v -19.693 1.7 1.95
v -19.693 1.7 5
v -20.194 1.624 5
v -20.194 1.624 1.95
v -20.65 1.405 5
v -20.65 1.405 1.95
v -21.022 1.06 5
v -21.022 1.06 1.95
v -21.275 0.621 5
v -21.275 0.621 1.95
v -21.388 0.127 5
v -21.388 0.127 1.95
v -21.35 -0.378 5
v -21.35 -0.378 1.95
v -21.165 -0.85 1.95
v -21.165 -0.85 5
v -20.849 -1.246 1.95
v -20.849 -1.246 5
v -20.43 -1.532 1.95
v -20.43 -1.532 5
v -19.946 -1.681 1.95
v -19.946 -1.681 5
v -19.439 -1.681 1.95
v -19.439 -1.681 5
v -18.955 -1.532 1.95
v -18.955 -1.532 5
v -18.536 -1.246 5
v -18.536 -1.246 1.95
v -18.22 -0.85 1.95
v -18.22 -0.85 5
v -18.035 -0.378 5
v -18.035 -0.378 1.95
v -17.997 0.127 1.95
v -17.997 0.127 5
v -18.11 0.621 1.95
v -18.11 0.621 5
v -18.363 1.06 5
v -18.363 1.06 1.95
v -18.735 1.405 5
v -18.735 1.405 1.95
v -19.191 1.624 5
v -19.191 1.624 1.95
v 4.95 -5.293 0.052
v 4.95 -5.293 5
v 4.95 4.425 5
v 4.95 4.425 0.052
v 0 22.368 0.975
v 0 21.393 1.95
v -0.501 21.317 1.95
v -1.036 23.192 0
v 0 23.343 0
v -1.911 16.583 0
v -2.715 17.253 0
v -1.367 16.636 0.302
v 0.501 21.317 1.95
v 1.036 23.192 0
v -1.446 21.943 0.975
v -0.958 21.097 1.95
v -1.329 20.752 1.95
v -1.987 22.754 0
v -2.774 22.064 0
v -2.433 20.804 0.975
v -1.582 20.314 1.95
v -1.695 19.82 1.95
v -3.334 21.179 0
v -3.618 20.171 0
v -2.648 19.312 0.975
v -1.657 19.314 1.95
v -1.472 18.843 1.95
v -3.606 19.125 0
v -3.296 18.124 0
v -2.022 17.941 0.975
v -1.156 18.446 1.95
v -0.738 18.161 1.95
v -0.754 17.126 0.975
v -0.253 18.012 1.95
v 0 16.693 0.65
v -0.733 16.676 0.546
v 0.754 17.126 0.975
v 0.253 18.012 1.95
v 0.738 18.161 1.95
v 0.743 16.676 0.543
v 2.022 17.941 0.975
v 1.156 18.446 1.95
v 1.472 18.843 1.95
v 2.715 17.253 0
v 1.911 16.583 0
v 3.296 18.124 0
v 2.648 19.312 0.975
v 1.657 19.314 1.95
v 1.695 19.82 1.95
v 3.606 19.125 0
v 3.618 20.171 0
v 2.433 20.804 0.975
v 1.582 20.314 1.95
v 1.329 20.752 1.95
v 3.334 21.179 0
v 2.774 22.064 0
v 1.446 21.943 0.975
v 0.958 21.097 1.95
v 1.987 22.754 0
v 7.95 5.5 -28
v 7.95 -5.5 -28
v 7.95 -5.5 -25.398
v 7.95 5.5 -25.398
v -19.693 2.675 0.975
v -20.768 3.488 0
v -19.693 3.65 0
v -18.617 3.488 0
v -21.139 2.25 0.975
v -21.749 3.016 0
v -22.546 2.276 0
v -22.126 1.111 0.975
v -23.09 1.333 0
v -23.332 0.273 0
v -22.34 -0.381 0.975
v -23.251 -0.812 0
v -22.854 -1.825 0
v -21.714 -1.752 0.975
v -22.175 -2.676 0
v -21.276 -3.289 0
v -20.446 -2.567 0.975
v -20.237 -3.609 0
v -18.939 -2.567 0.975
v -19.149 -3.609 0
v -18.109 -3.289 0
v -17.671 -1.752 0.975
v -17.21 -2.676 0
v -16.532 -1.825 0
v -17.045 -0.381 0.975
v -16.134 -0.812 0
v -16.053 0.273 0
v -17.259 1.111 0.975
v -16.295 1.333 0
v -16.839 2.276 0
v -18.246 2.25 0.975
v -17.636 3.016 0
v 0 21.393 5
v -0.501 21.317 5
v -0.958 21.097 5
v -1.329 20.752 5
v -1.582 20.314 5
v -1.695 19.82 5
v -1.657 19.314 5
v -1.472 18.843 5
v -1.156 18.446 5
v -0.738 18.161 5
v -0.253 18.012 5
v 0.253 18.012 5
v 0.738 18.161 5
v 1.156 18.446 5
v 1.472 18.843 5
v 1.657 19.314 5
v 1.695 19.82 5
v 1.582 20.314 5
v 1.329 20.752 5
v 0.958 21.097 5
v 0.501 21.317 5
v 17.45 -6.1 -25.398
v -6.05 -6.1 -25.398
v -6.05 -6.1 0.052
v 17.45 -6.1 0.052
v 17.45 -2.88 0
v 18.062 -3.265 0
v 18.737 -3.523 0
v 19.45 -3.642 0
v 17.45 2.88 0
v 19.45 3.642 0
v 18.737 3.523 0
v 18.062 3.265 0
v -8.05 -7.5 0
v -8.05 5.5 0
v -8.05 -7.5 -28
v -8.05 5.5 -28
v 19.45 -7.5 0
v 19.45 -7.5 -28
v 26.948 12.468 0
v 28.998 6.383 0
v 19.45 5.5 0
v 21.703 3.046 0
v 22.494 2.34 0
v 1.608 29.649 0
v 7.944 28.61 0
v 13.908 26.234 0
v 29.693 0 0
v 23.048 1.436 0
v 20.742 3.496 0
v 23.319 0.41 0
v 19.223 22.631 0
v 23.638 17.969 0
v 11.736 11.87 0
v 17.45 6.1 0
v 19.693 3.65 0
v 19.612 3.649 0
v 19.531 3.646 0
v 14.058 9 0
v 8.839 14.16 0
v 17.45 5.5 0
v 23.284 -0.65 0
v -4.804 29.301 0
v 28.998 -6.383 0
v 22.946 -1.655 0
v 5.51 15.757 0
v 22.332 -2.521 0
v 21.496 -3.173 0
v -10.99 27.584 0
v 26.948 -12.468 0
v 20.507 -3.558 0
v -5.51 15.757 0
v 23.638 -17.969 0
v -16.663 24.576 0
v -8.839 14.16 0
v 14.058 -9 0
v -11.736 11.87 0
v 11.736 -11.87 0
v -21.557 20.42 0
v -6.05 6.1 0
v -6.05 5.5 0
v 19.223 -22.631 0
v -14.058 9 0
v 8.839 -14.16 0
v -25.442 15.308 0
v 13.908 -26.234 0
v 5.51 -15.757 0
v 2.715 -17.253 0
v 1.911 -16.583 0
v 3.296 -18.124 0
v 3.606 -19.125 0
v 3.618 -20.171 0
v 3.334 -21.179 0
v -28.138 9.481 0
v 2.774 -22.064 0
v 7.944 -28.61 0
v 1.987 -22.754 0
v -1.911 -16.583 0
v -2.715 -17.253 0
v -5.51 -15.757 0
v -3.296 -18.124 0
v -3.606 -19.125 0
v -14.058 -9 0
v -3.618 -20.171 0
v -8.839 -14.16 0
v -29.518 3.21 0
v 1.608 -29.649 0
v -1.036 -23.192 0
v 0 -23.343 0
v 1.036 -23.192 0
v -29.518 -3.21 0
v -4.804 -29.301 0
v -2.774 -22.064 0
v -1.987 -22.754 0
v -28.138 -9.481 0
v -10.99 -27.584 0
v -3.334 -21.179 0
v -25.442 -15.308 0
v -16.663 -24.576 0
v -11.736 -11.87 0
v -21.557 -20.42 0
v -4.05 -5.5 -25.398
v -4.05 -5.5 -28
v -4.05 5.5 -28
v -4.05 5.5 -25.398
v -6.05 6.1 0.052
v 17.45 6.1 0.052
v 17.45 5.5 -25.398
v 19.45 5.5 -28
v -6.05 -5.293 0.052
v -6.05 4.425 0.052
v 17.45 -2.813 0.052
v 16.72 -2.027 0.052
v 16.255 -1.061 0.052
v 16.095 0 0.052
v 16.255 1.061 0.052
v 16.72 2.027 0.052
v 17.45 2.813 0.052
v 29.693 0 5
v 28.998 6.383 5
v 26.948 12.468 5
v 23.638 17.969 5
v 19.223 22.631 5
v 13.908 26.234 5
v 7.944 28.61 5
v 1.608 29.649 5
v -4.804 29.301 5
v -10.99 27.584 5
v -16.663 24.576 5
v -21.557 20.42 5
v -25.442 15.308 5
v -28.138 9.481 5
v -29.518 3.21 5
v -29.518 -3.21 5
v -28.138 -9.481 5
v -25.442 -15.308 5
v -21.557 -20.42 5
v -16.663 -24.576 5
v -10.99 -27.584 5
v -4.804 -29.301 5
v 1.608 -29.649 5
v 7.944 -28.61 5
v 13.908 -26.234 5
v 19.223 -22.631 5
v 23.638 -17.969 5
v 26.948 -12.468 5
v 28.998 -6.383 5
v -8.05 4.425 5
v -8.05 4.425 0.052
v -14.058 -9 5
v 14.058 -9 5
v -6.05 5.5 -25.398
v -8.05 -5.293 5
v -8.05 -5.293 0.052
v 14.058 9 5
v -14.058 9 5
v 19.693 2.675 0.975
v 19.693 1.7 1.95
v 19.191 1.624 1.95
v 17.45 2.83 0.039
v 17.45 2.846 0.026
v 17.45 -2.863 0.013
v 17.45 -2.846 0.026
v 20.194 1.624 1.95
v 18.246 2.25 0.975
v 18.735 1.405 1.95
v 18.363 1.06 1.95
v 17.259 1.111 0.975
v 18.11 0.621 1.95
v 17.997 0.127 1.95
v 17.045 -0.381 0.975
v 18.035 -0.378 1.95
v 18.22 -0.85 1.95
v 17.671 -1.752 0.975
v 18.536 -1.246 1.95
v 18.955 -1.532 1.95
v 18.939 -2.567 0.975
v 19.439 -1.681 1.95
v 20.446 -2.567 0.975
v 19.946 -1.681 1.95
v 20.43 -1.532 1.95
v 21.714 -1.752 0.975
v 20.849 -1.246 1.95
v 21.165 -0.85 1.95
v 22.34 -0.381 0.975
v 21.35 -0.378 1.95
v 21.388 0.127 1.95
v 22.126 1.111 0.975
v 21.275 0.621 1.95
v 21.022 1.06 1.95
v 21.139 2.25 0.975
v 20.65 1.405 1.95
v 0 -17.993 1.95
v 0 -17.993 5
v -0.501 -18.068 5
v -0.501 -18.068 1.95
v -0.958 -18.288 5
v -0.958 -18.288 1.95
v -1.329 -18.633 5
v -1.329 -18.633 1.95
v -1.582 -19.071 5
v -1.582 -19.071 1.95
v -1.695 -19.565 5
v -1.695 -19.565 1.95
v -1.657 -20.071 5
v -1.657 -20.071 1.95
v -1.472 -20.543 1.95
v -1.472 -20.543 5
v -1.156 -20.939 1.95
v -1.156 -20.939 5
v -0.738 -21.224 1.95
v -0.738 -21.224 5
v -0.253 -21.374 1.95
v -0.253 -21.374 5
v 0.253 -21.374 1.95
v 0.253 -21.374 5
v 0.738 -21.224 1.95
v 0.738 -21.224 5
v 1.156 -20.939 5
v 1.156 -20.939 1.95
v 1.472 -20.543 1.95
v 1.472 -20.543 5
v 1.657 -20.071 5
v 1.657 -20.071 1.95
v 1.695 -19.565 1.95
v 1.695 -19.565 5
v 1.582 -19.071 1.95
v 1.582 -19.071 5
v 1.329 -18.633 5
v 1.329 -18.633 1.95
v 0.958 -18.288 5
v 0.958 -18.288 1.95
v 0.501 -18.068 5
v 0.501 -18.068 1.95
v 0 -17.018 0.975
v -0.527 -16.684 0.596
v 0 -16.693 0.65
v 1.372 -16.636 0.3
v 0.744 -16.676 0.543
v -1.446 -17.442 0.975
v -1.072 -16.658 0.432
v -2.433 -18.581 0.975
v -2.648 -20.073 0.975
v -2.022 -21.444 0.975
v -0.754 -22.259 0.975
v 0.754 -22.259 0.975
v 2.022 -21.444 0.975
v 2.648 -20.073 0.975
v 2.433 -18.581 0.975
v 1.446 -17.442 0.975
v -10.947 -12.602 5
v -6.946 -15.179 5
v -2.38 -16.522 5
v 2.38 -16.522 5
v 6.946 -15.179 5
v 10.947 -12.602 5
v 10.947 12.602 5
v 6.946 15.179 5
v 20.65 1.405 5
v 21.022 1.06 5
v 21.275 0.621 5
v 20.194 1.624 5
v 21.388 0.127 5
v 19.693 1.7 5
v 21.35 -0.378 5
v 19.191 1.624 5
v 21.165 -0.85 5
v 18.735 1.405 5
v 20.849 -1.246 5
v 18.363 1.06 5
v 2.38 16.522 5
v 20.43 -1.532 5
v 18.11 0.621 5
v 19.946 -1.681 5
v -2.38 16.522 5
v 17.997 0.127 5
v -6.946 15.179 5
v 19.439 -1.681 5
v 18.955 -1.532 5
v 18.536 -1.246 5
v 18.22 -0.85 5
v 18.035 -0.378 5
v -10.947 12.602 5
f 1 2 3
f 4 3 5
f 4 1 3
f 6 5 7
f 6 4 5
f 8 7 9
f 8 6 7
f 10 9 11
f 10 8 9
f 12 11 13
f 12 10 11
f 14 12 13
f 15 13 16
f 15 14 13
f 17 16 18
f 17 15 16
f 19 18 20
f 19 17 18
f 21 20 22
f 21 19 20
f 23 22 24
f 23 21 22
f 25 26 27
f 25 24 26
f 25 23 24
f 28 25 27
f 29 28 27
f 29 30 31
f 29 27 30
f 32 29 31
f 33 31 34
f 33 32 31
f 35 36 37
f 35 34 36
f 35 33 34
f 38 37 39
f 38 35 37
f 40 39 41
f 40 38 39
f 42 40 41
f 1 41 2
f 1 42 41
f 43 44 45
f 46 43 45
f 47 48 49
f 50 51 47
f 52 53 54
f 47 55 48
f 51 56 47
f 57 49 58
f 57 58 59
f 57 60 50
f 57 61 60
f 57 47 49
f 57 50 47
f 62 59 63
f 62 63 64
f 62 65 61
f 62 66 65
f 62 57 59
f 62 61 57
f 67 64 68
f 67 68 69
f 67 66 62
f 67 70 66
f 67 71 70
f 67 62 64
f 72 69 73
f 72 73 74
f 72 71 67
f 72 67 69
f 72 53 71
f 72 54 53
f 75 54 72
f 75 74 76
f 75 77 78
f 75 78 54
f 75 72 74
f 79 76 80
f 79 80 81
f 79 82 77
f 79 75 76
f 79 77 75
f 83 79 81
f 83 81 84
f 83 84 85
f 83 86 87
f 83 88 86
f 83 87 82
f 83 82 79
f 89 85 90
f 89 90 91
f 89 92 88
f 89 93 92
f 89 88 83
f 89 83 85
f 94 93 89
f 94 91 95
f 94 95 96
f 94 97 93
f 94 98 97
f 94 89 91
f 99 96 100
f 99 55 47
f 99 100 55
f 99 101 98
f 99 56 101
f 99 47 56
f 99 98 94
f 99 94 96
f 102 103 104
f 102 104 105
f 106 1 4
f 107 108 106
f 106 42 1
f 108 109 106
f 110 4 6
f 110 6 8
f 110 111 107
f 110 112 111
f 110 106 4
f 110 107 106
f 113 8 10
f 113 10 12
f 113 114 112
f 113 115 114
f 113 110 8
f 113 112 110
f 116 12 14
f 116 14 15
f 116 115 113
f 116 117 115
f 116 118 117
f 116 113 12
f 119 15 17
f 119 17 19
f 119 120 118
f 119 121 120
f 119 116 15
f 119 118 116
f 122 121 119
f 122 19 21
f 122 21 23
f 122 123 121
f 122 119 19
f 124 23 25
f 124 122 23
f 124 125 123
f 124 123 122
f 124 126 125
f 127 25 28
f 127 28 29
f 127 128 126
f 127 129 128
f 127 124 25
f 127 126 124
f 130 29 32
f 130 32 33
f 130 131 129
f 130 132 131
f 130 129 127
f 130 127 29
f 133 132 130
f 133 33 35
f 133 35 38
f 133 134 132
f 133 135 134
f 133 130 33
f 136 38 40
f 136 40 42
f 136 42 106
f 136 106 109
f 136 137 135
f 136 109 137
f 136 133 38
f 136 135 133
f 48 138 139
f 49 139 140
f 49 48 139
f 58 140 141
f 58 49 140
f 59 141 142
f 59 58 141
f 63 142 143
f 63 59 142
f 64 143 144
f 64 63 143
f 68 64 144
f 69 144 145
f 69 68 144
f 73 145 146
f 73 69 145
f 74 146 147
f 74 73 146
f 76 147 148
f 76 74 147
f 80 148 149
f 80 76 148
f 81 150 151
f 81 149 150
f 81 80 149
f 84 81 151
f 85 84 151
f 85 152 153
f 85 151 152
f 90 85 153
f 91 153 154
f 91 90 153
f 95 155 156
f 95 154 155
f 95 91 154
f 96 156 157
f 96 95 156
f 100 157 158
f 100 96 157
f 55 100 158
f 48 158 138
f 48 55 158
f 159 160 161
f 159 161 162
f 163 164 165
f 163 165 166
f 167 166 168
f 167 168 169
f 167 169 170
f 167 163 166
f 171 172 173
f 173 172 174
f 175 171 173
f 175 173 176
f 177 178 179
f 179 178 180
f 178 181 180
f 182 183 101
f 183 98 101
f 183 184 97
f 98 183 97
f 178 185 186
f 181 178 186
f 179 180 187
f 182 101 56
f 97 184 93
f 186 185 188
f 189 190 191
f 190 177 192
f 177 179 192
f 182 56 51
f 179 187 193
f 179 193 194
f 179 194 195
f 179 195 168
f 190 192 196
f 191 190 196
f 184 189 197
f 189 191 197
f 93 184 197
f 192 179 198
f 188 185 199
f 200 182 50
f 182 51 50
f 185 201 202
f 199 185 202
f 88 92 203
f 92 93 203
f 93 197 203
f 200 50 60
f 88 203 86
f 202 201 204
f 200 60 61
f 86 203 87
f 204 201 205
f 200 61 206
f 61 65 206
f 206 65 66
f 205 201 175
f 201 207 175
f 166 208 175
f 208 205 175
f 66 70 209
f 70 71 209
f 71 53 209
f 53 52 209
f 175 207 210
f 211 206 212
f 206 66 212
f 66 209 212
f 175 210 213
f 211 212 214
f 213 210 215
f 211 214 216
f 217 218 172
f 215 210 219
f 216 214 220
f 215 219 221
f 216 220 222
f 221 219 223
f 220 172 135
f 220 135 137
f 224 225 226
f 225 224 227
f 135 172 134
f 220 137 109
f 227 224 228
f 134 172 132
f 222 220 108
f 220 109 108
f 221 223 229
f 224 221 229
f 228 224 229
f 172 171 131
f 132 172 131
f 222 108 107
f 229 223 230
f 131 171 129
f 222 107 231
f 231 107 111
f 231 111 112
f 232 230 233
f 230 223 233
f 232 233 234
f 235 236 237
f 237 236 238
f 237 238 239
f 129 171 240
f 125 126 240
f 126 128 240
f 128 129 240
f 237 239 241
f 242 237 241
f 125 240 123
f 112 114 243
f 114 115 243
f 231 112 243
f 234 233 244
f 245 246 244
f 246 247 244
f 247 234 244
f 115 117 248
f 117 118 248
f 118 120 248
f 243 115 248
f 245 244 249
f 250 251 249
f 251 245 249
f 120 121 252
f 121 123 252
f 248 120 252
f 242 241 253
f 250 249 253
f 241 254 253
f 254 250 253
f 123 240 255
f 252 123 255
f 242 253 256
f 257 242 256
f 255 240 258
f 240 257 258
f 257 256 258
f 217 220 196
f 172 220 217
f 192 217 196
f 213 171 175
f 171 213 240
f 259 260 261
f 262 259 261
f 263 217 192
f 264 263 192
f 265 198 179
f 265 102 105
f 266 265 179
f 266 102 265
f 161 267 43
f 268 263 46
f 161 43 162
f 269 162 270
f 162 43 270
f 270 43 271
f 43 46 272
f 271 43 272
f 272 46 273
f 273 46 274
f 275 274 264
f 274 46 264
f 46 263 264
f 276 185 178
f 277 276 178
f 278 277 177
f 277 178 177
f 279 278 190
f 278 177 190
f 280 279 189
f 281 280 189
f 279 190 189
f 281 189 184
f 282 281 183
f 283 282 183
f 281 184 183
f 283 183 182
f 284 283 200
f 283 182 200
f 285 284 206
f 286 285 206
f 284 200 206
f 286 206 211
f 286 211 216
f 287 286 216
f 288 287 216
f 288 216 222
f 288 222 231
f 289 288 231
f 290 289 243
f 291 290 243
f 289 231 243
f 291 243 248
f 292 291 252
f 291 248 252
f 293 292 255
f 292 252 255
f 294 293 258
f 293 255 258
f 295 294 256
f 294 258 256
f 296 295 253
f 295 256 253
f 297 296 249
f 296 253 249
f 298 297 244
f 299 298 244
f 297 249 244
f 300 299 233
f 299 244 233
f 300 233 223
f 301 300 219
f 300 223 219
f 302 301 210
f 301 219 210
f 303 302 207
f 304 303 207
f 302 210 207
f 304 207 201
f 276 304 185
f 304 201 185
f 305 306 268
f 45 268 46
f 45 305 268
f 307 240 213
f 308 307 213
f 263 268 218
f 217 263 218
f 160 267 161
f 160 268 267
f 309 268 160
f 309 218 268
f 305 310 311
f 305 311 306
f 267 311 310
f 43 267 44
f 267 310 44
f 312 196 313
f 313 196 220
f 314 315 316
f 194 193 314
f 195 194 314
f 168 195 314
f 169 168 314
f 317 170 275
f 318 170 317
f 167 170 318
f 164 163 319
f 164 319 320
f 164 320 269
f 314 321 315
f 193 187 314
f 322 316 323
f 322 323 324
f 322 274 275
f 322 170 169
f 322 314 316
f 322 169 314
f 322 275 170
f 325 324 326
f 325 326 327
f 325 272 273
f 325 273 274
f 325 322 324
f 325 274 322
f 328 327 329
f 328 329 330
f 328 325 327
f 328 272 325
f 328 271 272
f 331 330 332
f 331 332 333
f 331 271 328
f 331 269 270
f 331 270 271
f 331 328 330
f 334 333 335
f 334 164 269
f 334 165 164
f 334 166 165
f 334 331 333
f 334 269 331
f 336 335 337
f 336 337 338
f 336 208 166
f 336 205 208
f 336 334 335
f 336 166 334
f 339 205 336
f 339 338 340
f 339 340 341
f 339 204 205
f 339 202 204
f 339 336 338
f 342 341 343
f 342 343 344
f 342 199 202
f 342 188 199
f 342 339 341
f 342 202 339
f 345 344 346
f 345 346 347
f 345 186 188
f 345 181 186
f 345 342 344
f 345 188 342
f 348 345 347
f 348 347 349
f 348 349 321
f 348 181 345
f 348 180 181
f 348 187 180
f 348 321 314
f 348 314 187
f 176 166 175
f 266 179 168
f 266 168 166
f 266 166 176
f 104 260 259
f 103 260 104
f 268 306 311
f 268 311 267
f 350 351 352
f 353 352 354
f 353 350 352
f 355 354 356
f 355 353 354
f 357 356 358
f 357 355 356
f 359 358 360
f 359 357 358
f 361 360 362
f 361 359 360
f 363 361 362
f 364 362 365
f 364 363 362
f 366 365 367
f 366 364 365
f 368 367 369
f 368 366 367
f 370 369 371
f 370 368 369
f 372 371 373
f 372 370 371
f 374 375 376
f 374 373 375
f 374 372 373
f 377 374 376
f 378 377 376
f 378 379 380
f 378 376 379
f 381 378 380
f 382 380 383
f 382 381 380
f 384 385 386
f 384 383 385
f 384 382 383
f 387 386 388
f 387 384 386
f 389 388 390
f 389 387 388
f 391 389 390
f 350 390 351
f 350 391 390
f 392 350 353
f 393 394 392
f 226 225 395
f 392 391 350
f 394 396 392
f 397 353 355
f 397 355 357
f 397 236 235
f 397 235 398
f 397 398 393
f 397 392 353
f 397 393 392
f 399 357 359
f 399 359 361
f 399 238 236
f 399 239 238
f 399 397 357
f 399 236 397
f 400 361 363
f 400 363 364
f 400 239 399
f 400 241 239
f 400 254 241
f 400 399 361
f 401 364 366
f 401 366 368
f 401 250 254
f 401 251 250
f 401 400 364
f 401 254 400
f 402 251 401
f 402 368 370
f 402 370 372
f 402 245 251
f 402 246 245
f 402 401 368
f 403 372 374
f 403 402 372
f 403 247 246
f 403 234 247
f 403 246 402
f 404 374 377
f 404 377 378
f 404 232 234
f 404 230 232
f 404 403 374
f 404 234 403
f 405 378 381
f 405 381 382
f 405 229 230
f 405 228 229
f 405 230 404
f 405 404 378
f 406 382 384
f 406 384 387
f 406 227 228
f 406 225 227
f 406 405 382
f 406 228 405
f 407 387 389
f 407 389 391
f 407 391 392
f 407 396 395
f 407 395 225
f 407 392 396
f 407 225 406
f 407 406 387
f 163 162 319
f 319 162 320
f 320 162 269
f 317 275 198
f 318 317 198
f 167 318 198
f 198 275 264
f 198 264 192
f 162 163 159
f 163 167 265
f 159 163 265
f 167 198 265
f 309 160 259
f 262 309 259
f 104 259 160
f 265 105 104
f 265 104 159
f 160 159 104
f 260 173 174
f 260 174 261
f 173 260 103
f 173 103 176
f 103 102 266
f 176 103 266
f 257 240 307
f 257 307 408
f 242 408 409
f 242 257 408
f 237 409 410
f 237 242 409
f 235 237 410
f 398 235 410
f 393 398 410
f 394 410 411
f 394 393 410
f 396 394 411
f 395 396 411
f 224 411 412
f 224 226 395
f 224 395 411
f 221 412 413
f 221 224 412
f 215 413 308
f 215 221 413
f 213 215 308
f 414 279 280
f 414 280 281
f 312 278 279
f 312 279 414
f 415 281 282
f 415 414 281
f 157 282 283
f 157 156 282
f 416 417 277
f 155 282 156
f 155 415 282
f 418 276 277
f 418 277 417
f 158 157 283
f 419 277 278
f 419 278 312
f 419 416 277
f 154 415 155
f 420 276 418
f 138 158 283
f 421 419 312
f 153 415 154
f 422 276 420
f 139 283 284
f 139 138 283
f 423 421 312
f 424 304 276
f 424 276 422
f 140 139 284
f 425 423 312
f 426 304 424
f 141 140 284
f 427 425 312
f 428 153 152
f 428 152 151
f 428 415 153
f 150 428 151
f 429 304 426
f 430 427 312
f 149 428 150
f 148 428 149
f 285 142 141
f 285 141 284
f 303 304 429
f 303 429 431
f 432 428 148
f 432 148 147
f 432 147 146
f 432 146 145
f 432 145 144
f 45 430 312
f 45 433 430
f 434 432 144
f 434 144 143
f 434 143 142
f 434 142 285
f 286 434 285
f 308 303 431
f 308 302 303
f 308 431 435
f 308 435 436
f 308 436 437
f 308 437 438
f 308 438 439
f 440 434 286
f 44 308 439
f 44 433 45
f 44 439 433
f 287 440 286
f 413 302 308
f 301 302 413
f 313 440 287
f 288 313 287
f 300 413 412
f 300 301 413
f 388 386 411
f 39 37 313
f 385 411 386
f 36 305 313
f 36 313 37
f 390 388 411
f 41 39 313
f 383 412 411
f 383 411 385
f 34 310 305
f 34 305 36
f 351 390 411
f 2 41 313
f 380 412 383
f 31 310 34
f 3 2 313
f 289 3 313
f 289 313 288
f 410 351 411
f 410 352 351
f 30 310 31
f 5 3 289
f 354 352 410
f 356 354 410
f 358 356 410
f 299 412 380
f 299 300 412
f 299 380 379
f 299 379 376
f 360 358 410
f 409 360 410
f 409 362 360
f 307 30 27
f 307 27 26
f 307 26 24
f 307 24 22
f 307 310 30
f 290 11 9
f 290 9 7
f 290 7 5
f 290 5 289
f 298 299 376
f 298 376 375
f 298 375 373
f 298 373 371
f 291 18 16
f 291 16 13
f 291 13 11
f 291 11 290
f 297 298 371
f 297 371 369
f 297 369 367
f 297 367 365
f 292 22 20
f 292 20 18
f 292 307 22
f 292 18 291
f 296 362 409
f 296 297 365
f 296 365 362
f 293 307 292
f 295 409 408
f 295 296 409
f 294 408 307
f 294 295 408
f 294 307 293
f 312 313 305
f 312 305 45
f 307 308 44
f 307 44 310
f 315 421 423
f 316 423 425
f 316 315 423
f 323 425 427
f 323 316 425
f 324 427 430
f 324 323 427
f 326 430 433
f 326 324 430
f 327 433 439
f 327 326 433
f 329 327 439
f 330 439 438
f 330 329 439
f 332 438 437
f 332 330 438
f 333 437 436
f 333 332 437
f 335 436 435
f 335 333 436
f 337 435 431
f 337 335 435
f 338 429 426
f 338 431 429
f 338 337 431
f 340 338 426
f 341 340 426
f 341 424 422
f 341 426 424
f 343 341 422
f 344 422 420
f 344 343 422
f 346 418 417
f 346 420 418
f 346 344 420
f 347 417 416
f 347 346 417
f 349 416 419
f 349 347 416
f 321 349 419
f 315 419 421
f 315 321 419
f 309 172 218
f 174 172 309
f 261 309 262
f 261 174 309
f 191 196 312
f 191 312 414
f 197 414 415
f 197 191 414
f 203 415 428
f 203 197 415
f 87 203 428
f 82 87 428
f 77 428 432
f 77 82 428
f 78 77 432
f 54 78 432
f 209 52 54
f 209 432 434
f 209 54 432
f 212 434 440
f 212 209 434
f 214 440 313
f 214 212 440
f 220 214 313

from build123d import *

# Parameters (mm, degrees)
SKETCH1_R                                      = 29.692527183
SKETCH1_R_2                                    = 22.692527183
SKETCH1_R_3                                    = 19.692527183
SKETCH1_R_4                                    = 16.692527183
BOSS_EXTRUDE1_DEPTH                            = 5
SKETCH9_W                                      = 27.5
SKETCH9_H                                      = 28
BOSS_EXTRUDE2_DEPTH                            = 7.5
SKETCH10_W                                     = 23.5
SKETCH10_H                                     = 25.45
CUT_EXTRUDE1_DEPTH                             = 6.1
SKETCH12_W                                     = 12
SKETCH12_H                                     = 11
CUT_EXTRUDE2_DEPTH                             = 3
SKETCH11_W                                     = 13
SKETCH11_H                                     = 9.717675131
CUT_EXTRUDE3_DEPTH                             = 4.947760199
CSK_FOR_M3_FLAT_HEAD_MACHINE_SCREW1_AT_2_COUNT = 2
CSK_FOR_M3_FLAT_HEAD_MACHINE_SCREW1_AT_2_PITCH = 27.84943902
CSK_FOR_M3_FLAT_HEAD_MACHINE_SCREW1_AT_3_COUNT = 2
CSK_FOR_M3_FLAT_HEAD_MACHINE_SCREW1_AT_3_PITCH = 27.84943902
CSK_FOR_M3_FLAT_HEAD_MACHINE_SCREW1_AT_4_COUNT = 2
CSK_FOR_M3_FLAT_HEAD_MACHINE_SCREW1_AT_4_PITCH = 39.385054366
SPLIT1_START                                   = 5.5
SPLIT1_OUTLINE_W                               = 27.5
SPLIT1_OUTLINE_H                               = 28
SPLIT1_DEPTH                                   = 2
SPLIT1_START_2                                 = -28
SPLIT1_2_DEPTH                                 = 28
SPLIT1_3_OUTLINE_W                             = 23.5
SPLIT1_3_OUTLINE_H                             = 0.6
SPLIT1_3_DEPTH                                 = 2.602239801


# Read off the part's stored shape, not the designer's step: Split1
with BuildPart() as part:
    # Sketch1 → Boss-Extrude1 (new body)
    # profile 1 of 4: a face of its own
    with BuildSketch(Plane(origin=(0, 0, 0), x_dir=(-1, 0, 0), z_dir=(0, 0, 1))):
        with Locations(Location((0, 0, 0), (0, 0, 180))):
            Circle(SKETCH1_R)
        Circle(SKETCH1_R_2, mode=Mode.SUBTRACT)
    # profile 2 of 4: a face of its own
    with BuildSketch(Plane(origin=(0, 0, 0), x_dir=(-1, 0, 0), z_dir=(0, 0, 1))):
        Circle(SKETCH1_R_2)
        Circle(SKETCH1_R_3, mode=Mode.SUBTRACT)
    # profile 3 of 4: a face of its own
    with BuildSketch(Plane(origin=(0, 0, 0), x_dir=(-1, 0, 0), z_dir=(0, 0, 1))):
        Circle(SKETCH1_R_3)
        Circle(SKETCH1_R_4, mode=Mode.SUBTRACT)
    # profile 4 of 4: a face of its own
    with BuildSketch(Plane(origin=(0, 0, 0), x_dir=(-1, 0, 0), z_dir=(0, 0, 1))):
        with BuildLine():
            Line((14.058465911, 9), (-14.058465911, 9))
            ThreePointArc((-14.058465911, 9), (-16.692527183, 0), (-14.058465911, -9))
            Line((-14.058465911, -9), (14.058465911, -9))
            ThreePointArc((14.058465911, -9), (16.020483578, -4.688770595), (16.692527183, 0))
            ThreePointArc((16.692527183, 0), (16.020483578, 4.688770595), (14.058465911, 9))
        make_face()
    extrude(amount=BOSS_EXTRUDE1_DEPTH)

    # Sketch9 → Boss-Extrude2 (add, symmetric)
    with BuildSketch(Plane(origin=(0, 0, 0), x_dir=(1, 0, 0), z_dir=(0, 1, 0))):
        with Locations((5.7, 14)):
            Rectangle(SKETCH9_W, SKETCH9_H)
    extrude(amount=BOSS_EXTRUDE2_DEPTH, both=True)

    # Sketch10 → Cut-Extrude1 (cut, symmetric)
    with BuildSketch(Plane(origin=(0, 0, 0), x_dir=(1, 0, 0), z_dir=(0, 1, 0))):
        with Locations((5.7, 12.672760199)):
            Rectangle(SKETCH10_W, SKETCH10_H)
    extrude(amount=CUT_EXTRUDE1_DEPTH, both=True, mode=Mode.SUBTRACT)

    # Sketch12 → Cut-Extrude2 (cut)
    with BuildSketch(Plane.XY.offset(-28)):
        with Locations((1.95, 0)):
            Rectangle(SKETCH12_W, SKETCH12_H)
    extrude(amount=CUT_EXTRUDE2_DEPTH, mode=Mode.SUBTRACT)

    # Sketch11 → Cut-Extrude3 (cut)
    with BuildSketch(Plane.XY.offset(5)):
        with Locations((-1.55, -0.433824782)):
            Rectangle(SKETCH11_W, SKETCH11_H)
    extrude(amount=-CUT_EXTRUDE3_DEPTH, mode=Mode.SUBTRACT)

    # Sketch13 → CSK for M3 Flat Head Machine Screw1 (revolve, cut)
    with BuildSketch(Plane.YZ.offset(-19.692527183)):
        Polygon((0, 0), (0, 13.021463052), (1.7, 12), (1.7, 1.95), (3.65, 0), align=None)
    csk_for_m3_flat_head_machine_screw1 = revolve(axis=Axis((-19.692527183, 0, -6.35), (0, 0, 1)), mode=Mode.SUBTRACT)

    # CSK for M3 Flat Head Machine Screw1 at 2: CSK for M3 Flat Head Machine Screw1 ×2
    with Locations(*[Vector(0.7071067811865476, -0.7071067811865475, 0) * (i * CSK_FOR_M3_FLAT_HEAD_MACHINE_SCREW1_AT_2_PITCH) for i in range(1, CSK_FOR_M3_FLAT_HEAD_MACHINE_SCREW1_AT_2_COUNT)]):
        add(csk_for_m3_flat_head_machine_screw1, mode=Mode.SUBTRACT)

    # CSK for M3 Flat Head Machine Screw1 at 3: CSK for M3 Flat Head Machine Screw1 ×2
    with Locations(*[Vector(0.7071067811865476, 0.7071067811865475, 0) * (i * CSK_FOR_M3_FLAT_HEAD_MACHINE_SCREW1_AT_3_PITCH) for i in range(1, CSK_FOR_M3_FLAT_HEAD_MACHINE_SCREW1_AT_3_COUNT)]):
        add(csk_for_m3_flat_head_machine_screw1, mode=Mode.SUBTRACT)

    # CSK for M3 Flat Head Machine Screw1 at 4: CSK for M3 Flat Head Machine Screw1 ×2
    with Locations(*[(i * CSK_FOR_M3_FLAT_HEAD_MACHINE_SCREW1_AT_4_PITCH, 0, 0) for i in range(1, CSK_FOR_M3_FLAT_HEAD_MACHINE_SCREW1_AT_4_COUNT)]):
        add(csk_for_m3_flat_head_machine_screw1, mode=Mode.SUBTRACT)

    # Split1 outline → Split1 (cut)
    with BuildSketch(Plane(origin=(0, 0, 0), x_dir=(1, 0, 0), z_dir=(0, 1, 0)).offset(SPLIT1_START)):
        with Locations((5.7, 14)):
            Rectangle(SPLIT1_OUTLINE_W, SPLIT1_OUTLINE_H)
    extrude(amount=SPLIT1_DEPTH, mode=Mode.SUBTRACT)


with BuildPart() as body_2:
    # Split1 2 outline → Split1 2 (new body)
    with BuildSketch(Plane.XY.offset(SPLIT1_START_2)):
        Polygon((-8.05, 5.5), (-6.05, 5.5), (-6.05, 6.1), (17.45, 6.1), (17.45, 5.5), (19.45, 5.5), (19.45, 7.5), (-8.05, 7.5), align=None)
    extrude(amount=SPLIT1_2_DEPTH)

    # Split1 3 outline → Split1 3 (add)
    with BuildSketch(Plane.XY.offset(SPLIT1_START_2)):
        with Locations((5.7, 5.8)):
            Rectangle(SPLIT1_3_OUTLINE_W, SPLIT1_3_OUTLINE_H)
    extrude(amount=SPLIT1_3_DEPTH)


solid = part.part
